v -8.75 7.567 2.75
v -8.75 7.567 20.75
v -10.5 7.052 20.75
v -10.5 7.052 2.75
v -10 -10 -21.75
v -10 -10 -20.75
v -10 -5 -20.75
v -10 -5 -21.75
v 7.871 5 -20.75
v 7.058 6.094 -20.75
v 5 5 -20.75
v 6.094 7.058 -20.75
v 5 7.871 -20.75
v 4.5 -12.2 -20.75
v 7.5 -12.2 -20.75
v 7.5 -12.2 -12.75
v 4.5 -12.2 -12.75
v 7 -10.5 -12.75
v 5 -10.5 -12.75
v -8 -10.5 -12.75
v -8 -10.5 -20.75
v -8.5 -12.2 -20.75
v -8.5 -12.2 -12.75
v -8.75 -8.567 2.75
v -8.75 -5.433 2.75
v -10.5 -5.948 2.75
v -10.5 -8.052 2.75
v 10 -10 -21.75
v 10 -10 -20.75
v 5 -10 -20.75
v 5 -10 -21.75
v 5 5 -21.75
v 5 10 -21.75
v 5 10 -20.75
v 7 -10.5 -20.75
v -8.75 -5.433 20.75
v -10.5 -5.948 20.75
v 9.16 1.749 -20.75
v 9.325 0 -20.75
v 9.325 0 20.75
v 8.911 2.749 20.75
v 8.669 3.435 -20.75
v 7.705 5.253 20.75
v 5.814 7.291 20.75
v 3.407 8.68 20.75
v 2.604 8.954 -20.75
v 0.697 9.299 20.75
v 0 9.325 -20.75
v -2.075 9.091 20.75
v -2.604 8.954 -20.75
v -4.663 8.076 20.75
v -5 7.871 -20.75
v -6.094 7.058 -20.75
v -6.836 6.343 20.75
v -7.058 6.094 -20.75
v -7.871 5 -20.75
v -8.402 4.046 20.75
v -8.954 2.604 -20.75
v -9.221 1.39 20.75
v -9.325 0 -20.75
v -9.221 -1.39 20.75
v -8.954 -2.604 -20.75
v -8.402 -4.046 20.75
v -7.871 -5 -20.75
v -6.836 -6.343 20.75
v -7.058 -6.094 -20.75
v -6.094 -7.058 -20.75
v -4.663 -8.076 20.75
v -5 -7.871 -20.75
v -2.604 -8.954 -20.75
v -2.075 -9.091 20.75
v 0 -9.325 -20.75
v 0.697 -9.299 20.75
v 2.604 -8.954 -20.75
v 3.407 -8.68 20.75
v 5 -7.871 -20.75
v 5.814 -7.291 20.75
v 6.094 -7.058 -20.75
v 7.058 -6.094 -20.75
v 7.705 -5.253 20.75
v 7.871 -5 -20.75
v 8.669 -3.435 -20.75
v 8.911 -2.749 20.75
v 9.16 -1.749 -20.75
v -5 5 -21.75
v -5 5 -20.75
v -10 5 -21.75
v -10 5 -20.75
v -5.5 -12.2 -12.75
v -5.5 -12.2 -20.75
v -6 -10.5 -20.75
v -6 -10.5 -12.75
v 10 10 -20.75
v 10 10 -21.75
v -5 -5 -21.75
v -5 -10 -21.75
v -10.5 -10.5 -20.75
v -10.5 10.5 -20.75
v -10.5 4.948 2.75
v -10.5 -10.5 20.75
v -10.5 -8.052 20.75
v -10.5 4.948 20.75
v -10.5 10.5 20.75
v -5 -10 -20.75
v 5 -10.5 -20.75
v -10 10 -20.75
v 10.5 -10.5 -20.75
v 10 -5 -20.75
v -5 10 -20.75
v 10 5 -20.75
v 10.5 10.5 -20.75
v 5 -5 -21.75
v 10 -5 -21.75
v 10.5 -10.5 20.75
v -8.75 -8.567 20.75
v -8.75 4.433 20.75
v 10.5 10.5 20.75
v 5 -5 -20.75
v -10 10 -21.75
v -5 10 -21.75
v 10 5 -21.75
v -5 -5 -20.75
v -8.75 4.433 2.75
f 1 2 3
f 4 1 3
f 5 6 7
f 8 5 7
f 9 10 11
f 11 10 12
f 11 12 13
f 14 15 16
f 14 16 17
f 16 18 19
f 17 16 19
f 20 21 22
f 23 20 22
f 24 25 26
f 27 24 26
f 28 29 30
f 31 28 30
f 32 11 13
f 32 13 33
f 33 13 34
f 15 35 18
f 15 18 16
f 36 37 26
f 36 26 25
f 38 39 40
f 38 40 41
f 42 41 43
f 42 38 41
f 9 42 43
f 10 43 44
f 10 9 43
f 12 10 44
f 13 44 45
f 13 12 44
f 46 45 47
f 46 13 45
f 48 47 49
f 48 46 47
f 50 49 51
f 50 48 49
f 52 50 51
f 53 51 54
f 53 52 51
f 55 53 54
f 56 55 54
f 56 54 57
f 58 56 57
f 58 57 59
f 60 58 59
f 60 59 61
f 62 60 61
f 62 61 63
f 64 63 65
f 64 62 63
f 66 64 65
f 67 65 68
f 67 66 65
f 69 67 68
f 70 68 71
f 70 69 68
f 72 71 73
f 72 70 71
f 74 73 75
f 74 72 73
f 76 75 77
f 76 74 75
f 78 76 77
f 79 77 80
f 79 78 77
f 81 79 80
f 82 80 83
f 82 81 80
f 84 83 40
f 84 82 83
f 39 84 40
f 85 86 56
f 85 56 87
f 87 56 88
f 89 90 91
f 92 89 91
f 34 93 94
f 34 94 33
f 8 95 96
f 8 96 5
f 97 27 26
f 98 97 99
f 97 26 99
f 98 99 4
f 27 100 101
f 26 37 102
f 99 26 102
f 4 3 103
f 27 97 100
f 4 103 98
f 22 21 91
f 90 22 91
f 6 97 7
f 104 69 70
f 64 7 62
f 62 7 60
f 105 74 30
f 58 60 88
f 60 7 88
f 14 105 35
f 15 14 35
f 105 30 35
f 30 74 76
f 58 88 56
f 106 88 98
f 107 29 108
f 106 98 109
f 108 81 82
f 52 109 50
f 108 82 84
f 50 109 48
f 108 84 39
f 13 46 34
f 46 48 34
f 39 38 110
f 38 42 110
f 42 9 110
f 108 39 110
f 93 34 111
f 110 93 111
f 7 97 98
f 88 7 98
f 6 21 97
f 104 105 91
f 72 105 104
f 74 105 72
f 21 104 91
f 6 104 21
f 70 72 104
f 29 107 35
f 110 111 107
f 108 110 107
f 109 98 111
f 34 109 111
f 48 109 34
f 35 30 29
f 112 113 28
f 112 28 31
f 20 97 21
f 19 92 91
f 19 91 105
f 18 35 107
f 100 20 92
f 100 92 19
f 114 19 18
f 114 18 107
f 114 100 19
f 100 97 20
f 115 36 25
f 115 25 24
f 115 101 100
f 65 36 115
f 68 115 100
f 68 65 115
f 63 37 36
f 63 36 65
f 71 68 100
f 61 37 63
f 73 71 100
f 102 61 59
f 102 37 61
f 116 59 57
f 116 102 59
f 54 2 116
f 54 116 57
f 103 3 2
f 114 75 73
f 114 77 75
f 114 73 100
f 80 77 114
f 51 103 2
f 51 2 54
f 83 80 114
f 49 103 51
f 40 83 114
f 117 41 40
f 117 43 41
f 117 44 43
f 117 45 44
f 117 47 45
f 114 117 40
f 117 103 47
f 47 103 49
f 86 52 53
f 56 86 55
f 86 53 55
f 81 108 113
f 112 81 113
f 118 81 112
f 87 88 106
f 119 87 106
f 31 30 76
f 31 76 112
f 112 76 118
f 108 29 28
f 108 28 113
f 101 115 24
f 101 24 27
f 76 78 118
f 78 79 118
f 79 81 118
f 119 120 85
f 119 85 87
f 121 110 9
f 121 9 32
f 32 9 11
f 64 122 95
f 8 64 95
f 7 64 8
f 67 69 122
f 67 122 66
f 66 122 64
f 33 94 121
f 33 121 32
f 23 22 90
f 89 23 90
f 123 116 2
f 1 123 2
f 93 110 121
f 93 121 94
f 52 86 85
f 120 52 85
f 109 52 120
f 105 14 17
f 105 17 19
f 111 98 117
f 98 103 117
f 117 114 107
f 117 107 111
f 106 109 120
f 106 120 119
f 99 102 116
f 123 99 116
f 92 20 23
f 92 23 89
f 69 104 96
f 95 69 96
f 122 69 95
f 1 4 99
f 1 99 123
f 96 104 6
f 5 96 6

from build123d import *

# Parameters (mm, degrees)
CROQUIS1_W              = 21
CROQUIS1_H              = 21
CROQUIS1_R              = 9.325
SALIENTE_EXTRUIR1_DEPTH = 20.75
CROQUIS2_W              = 5
CROQUIS2_H              = 5
SALIENTE_EXTRUIR3_DEPTH = 1
CORTAR_EXTRUIR2_DEPTH   = 18
SALIENTE_EXTRUIR7_DEPTH = 8


with BuildPart() as part:
    # Croquis1 → Saliente-Extruir1 (new, symmetric)
    with BuildSketch(Plane.XY):
        Rectangle(CROQUIS1_W, CROQUIS1_H)
        Circle(CROQUIS1_R, mode=Mode.SUBTRACT)
    extrude(amount=SALIENTE_EXTRUIR1_DEPTH, both=True)

    # Croquis2 → Saliente-Extruir3 (add)
    with BuildSketch(Plane(origin=(0, 0, -20.75), x_dir=(-1, 0, 0), z_dir=(0, 0, -1))):
        with Locations((-7.5, 7.5)):
            Rectangle(CROQUIS2_W, CROQUIS2_H)
        with Locations((7.5, 7.5)):
            Rectangle(CROQUIS2_W, CROQUIS2_H)
        with Locations((7.5, -7.5)):
            Rectangle(CROQUIS2_W, CROQUIS2_H)
        with Locations((-7.5, -7.5)):
            Rectangle(CROQUIS2_W, CROQUIS2_H)
    extrude(amount=SALIENTE_EXTRUIR3_DEPTH)

    # Croquis8 → Cortar-Extruir2 (cut)
    with BuildSketch(Plane.XY.offset(20.75)):
        Polygon((-10.55, -5.962588103), (-8.75, -5.433176338), (-8.75, -8.566823662), (-10.55, -8.037411897), align=None)
        Polygon((-10.55, 7.037411897), (-10.55, 4.962588103), (-8.75, 4.433176338), (-8.75, 7.566823662), align=None)
    extrude(amount=-CORTAR_EXTRUIR2_DEPTH, mode=Mode.SUBTRACT)

    # Croquis9 → Saliente-Extruir7 (add)
    with BuildSketch(Plane(origin=(0, 0, -20.75), x_dir=(-1, 0, 0), z_dir=(0, 0, -1))):
        Polygon((6, -10.5), (8, -10.5), (8.5, -12.2), (5.5, -12.2), align=None)
        Polygon((-4.5, -12.2), (-5, -10.5), (-7, -10.5), (-7.5, -12.2), align=None)
    extrude(amount=-SALIENTE_EXTRUIR7_DEPTH)


solid = part.part
